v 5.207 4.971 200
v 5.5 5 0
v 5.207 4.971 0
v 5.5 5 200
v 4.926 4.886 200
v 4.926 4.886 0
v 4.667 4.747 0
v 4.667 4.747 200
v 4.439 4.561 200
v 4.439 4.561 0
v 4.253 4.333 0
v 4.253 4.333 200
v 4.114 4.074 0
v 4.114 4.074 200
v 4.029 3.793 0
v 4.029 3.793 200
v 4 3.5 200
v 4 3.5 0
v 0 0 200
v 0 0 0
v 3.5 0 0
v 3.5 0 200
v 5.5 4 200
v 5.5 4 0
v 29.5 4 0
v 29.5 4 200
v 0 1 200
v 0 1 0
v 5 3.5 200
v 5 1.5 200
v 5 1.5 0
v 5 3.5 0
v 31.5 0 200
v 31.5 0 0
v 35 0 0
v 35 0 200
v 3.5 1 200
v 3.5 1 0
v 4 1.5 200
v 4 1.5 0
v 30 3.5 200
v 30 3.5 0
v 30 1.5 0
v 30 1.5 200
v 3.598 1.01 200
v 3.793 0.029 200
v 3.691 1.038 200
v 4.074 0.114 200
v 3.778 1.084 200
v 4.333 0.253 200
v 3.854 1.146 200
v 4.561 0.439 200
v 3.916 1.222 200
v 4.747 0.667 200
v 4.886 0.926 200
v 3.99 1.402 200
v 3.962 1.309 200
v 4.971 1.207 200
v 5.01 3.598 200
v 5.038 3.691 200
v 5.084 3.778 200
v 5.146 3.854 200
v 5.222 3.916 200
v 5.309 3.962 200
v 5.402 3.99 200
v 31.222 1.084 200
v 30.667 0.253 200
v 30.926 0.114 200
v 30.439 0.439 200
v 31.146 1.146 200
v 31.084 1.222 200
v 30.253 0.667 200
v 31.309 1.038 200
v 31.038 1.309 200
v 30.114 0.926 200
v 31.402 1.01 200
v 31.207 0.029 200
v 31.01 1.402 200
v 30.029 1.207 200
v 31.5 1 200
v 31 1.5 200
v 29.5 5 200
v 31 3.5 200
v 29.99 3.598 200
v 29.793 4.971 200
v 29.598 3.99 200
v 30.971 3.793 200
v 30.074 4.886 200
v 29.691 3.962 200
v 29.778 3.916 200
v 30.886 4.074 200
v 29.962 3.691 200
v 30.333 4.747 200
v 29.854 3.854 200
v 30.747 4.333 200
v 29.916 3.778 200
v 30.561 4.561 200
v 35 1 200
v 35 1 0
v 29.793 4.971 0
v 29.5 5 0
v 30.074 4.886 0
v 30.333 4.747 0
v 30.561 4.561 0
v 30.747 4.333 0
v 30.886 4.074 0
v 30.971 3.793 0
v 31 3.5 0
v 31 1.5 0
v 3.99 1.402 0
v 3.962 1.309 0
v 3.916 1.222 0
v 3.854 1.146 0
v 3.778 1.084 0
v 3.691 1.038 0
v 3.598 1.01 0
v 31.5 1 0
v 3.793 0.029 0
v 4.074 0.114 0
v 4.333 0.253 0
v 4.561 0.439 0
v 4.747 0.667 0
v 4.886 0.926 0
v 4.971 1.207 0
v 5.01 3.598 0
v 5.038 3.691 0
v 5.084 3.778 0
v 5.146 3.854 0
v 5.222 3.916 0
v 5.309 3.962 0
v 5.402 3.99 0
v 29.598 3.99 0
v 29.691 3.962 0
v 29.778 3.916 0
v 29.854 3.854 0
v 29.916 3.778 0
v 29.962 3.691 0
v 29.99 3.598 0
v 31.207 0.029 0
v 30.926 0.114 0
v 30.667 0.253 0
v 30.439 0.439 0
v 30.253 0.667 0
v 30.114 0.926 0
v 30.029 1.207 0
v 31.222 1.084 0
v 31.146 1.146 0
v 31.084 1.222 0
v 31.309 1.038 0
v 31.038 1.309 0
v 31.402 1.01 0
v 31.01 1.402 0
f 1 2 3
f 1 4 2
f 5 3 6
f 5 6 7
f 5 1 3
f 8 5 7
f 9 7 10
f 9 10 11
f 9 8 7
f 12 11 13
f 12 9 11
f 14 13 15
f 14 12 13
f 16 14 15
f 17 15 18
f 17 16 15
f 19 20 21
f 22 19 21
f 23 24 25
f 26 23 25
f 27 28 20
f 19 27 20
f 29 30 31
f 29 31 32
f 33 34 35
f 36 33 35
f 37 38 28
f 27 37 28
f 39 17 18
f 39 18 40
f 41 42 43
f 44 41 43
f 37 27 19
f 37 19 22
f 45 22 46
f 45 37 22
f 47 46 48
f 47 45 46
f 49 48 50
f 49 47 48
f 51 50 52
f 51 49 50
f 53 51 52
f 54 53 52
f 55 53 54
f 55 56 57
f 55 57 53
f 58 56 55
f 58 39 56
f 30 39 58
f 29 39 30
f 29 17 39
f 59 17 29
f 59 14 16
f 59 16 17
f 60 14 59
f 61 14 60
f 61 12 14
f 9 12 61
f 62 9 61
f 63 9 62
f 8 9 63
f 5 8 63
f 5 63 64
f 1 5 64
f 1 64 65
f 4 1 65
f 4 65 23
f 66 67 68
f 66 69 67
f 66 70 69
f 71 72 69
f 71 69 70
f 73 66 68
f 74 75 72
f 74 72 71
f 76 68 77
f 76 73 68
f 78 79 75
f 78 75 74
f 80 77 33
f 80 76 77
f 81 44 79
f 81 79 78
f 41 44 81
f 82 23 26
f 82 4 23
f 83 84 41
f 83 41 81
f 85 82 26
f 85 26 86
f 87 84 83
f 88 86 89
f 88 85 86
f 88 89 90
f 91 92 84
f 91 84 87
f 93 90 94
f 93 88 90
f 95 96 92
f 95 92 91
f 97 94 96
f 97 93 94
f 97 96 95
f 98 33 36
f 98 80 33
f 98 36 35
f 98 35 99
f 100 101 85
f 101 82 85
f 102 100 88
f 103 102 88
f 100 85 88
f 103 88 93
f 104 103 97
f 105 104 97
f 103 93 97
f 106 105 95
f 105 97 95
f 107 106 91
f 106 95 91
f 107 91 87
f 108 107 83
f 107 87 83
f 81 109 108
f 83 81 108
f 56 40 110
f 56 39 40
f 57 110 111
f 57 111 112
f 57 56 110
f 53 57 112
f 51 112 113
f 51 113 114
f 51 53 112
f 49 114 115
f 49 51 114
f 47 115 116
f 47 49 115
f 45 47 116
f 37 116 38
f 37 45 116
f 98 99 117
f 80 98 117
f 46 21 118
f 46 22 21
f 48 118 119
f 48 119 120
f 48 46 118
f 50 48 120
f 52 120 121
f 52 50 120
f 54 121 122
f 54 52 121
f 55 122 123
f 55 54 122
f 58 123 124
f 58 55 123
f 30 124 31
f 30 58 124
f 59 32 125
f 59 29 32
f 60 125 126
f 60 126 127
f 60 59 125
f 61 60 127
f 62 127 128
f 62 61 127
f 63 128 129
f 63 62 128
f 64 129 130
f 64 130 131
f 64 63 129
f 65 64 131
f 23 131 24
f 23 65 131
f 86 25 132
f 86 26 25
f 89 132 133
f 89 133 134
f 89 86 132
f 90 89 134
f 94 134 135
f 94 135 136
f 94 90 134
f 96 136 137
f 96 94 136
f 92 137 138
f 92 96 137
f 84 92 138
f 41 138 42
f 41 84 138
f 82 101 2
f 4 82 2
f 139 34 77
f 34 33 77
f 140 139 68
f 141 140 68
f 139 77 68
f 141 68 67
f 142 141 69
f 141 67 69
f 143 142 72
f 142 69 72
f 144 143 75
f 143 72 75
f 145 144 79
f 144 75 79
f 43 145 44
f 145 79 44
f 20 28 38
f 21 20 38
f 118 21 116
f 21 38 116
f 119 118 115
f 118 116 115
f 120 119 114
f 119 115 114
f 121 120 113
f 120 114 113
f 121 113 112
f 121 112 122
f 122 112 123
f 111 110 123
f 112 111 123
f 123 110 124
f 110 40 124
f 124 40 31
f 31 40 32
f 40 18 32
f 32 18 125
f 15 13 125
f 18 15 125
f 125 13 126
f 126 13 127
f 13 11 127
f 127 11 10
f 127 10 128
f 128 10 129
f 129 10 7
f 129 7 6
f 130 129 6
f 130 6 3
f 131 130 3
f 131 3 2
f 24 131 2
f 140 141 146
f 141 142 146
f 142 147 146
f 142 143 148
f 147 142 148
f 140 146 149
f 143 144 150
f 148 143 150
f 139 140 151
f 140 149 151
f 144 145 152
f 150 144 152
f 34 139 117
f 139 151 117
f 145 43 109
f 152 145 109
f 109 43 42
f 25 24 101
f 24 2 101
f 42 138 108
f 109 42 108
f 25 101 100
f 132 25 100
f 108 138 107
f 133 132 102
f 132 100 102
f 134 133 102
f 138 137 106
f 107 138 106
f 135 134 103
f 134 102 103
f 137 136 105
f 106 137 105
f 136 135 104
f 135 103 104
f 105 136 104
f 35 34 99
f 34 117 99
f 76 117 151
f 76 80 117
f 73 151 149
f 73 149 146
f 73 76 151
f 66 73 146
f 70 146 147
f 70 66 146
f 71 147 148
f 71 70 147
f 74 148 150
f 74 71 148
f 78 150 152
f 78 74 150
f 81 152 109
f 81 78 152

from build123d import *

# Parameters (mm, degrees)
PAD_DEPTH   = 200
FILLET_R    = 1.5
FILLET001_R = 1.5
FILLET002_R = 0.5
FILLET003_R = 0.5
FILLET004_R = 0.5
FILLET005_R = 0.5


with BuildPart() as part:
    # Sketch → Pad (new body)
    with BuildSketch(Plane.XY):
        Polygon((0, 0), (5, 0), (5, 4), (30, 4), (30, 0), (35, 0), (35, 1), (31, 1), (31, 5), (4, 5), (4, 1), (0, 1), align=None)
    extrude(amount=PAD_DEPTH)

    # Fillet
    fillet_edges = [part.edges().sort_by_distance(p)[0] for p in [
        (4, 5, 100),
    ]]
    fillet(fillet_edges, radius=FILLET_R)

    # Fillet001
    fillet001_edges = [part.edges().sort_by_distance(p)[0] for p in [
        (31, 5, 100),
        (30, 0, 100),
        (5, 0, 100),
    ]]
    fillet(fillet001_edges, radius=FILLET001_R)

    # Fillet002
    fillet002_edges = [part.edges().sort_by_distance(p)[0] for p in [
        (5, 4, 100),
    ]]
    fillet(fillet002_edges, radius=FILLET002_R)

    # Fillet003
    fillet003_edges = [part.edges().sort_by_distance(p)[0] for p in [
        (31, 1, 100),
    ]]
    fillet(fillet003_edges, radius=FILLET003_R)

    # Fillet004
    fillet004_edges = [part.edges().sort_by_distance(p)[0] for p in [
        (4, 1, 100),
    ]]
    fillet(fillet004_edges, radius=FILLET004_R)

    # Fillet005
    fillet005_edges = [part.edges().sort_by_distance(p)[0] for p in [
        (30, 4, 100),
    ]]
    fillet(fillet005_edges, radius=FILLET005_R)


solid = part.part
